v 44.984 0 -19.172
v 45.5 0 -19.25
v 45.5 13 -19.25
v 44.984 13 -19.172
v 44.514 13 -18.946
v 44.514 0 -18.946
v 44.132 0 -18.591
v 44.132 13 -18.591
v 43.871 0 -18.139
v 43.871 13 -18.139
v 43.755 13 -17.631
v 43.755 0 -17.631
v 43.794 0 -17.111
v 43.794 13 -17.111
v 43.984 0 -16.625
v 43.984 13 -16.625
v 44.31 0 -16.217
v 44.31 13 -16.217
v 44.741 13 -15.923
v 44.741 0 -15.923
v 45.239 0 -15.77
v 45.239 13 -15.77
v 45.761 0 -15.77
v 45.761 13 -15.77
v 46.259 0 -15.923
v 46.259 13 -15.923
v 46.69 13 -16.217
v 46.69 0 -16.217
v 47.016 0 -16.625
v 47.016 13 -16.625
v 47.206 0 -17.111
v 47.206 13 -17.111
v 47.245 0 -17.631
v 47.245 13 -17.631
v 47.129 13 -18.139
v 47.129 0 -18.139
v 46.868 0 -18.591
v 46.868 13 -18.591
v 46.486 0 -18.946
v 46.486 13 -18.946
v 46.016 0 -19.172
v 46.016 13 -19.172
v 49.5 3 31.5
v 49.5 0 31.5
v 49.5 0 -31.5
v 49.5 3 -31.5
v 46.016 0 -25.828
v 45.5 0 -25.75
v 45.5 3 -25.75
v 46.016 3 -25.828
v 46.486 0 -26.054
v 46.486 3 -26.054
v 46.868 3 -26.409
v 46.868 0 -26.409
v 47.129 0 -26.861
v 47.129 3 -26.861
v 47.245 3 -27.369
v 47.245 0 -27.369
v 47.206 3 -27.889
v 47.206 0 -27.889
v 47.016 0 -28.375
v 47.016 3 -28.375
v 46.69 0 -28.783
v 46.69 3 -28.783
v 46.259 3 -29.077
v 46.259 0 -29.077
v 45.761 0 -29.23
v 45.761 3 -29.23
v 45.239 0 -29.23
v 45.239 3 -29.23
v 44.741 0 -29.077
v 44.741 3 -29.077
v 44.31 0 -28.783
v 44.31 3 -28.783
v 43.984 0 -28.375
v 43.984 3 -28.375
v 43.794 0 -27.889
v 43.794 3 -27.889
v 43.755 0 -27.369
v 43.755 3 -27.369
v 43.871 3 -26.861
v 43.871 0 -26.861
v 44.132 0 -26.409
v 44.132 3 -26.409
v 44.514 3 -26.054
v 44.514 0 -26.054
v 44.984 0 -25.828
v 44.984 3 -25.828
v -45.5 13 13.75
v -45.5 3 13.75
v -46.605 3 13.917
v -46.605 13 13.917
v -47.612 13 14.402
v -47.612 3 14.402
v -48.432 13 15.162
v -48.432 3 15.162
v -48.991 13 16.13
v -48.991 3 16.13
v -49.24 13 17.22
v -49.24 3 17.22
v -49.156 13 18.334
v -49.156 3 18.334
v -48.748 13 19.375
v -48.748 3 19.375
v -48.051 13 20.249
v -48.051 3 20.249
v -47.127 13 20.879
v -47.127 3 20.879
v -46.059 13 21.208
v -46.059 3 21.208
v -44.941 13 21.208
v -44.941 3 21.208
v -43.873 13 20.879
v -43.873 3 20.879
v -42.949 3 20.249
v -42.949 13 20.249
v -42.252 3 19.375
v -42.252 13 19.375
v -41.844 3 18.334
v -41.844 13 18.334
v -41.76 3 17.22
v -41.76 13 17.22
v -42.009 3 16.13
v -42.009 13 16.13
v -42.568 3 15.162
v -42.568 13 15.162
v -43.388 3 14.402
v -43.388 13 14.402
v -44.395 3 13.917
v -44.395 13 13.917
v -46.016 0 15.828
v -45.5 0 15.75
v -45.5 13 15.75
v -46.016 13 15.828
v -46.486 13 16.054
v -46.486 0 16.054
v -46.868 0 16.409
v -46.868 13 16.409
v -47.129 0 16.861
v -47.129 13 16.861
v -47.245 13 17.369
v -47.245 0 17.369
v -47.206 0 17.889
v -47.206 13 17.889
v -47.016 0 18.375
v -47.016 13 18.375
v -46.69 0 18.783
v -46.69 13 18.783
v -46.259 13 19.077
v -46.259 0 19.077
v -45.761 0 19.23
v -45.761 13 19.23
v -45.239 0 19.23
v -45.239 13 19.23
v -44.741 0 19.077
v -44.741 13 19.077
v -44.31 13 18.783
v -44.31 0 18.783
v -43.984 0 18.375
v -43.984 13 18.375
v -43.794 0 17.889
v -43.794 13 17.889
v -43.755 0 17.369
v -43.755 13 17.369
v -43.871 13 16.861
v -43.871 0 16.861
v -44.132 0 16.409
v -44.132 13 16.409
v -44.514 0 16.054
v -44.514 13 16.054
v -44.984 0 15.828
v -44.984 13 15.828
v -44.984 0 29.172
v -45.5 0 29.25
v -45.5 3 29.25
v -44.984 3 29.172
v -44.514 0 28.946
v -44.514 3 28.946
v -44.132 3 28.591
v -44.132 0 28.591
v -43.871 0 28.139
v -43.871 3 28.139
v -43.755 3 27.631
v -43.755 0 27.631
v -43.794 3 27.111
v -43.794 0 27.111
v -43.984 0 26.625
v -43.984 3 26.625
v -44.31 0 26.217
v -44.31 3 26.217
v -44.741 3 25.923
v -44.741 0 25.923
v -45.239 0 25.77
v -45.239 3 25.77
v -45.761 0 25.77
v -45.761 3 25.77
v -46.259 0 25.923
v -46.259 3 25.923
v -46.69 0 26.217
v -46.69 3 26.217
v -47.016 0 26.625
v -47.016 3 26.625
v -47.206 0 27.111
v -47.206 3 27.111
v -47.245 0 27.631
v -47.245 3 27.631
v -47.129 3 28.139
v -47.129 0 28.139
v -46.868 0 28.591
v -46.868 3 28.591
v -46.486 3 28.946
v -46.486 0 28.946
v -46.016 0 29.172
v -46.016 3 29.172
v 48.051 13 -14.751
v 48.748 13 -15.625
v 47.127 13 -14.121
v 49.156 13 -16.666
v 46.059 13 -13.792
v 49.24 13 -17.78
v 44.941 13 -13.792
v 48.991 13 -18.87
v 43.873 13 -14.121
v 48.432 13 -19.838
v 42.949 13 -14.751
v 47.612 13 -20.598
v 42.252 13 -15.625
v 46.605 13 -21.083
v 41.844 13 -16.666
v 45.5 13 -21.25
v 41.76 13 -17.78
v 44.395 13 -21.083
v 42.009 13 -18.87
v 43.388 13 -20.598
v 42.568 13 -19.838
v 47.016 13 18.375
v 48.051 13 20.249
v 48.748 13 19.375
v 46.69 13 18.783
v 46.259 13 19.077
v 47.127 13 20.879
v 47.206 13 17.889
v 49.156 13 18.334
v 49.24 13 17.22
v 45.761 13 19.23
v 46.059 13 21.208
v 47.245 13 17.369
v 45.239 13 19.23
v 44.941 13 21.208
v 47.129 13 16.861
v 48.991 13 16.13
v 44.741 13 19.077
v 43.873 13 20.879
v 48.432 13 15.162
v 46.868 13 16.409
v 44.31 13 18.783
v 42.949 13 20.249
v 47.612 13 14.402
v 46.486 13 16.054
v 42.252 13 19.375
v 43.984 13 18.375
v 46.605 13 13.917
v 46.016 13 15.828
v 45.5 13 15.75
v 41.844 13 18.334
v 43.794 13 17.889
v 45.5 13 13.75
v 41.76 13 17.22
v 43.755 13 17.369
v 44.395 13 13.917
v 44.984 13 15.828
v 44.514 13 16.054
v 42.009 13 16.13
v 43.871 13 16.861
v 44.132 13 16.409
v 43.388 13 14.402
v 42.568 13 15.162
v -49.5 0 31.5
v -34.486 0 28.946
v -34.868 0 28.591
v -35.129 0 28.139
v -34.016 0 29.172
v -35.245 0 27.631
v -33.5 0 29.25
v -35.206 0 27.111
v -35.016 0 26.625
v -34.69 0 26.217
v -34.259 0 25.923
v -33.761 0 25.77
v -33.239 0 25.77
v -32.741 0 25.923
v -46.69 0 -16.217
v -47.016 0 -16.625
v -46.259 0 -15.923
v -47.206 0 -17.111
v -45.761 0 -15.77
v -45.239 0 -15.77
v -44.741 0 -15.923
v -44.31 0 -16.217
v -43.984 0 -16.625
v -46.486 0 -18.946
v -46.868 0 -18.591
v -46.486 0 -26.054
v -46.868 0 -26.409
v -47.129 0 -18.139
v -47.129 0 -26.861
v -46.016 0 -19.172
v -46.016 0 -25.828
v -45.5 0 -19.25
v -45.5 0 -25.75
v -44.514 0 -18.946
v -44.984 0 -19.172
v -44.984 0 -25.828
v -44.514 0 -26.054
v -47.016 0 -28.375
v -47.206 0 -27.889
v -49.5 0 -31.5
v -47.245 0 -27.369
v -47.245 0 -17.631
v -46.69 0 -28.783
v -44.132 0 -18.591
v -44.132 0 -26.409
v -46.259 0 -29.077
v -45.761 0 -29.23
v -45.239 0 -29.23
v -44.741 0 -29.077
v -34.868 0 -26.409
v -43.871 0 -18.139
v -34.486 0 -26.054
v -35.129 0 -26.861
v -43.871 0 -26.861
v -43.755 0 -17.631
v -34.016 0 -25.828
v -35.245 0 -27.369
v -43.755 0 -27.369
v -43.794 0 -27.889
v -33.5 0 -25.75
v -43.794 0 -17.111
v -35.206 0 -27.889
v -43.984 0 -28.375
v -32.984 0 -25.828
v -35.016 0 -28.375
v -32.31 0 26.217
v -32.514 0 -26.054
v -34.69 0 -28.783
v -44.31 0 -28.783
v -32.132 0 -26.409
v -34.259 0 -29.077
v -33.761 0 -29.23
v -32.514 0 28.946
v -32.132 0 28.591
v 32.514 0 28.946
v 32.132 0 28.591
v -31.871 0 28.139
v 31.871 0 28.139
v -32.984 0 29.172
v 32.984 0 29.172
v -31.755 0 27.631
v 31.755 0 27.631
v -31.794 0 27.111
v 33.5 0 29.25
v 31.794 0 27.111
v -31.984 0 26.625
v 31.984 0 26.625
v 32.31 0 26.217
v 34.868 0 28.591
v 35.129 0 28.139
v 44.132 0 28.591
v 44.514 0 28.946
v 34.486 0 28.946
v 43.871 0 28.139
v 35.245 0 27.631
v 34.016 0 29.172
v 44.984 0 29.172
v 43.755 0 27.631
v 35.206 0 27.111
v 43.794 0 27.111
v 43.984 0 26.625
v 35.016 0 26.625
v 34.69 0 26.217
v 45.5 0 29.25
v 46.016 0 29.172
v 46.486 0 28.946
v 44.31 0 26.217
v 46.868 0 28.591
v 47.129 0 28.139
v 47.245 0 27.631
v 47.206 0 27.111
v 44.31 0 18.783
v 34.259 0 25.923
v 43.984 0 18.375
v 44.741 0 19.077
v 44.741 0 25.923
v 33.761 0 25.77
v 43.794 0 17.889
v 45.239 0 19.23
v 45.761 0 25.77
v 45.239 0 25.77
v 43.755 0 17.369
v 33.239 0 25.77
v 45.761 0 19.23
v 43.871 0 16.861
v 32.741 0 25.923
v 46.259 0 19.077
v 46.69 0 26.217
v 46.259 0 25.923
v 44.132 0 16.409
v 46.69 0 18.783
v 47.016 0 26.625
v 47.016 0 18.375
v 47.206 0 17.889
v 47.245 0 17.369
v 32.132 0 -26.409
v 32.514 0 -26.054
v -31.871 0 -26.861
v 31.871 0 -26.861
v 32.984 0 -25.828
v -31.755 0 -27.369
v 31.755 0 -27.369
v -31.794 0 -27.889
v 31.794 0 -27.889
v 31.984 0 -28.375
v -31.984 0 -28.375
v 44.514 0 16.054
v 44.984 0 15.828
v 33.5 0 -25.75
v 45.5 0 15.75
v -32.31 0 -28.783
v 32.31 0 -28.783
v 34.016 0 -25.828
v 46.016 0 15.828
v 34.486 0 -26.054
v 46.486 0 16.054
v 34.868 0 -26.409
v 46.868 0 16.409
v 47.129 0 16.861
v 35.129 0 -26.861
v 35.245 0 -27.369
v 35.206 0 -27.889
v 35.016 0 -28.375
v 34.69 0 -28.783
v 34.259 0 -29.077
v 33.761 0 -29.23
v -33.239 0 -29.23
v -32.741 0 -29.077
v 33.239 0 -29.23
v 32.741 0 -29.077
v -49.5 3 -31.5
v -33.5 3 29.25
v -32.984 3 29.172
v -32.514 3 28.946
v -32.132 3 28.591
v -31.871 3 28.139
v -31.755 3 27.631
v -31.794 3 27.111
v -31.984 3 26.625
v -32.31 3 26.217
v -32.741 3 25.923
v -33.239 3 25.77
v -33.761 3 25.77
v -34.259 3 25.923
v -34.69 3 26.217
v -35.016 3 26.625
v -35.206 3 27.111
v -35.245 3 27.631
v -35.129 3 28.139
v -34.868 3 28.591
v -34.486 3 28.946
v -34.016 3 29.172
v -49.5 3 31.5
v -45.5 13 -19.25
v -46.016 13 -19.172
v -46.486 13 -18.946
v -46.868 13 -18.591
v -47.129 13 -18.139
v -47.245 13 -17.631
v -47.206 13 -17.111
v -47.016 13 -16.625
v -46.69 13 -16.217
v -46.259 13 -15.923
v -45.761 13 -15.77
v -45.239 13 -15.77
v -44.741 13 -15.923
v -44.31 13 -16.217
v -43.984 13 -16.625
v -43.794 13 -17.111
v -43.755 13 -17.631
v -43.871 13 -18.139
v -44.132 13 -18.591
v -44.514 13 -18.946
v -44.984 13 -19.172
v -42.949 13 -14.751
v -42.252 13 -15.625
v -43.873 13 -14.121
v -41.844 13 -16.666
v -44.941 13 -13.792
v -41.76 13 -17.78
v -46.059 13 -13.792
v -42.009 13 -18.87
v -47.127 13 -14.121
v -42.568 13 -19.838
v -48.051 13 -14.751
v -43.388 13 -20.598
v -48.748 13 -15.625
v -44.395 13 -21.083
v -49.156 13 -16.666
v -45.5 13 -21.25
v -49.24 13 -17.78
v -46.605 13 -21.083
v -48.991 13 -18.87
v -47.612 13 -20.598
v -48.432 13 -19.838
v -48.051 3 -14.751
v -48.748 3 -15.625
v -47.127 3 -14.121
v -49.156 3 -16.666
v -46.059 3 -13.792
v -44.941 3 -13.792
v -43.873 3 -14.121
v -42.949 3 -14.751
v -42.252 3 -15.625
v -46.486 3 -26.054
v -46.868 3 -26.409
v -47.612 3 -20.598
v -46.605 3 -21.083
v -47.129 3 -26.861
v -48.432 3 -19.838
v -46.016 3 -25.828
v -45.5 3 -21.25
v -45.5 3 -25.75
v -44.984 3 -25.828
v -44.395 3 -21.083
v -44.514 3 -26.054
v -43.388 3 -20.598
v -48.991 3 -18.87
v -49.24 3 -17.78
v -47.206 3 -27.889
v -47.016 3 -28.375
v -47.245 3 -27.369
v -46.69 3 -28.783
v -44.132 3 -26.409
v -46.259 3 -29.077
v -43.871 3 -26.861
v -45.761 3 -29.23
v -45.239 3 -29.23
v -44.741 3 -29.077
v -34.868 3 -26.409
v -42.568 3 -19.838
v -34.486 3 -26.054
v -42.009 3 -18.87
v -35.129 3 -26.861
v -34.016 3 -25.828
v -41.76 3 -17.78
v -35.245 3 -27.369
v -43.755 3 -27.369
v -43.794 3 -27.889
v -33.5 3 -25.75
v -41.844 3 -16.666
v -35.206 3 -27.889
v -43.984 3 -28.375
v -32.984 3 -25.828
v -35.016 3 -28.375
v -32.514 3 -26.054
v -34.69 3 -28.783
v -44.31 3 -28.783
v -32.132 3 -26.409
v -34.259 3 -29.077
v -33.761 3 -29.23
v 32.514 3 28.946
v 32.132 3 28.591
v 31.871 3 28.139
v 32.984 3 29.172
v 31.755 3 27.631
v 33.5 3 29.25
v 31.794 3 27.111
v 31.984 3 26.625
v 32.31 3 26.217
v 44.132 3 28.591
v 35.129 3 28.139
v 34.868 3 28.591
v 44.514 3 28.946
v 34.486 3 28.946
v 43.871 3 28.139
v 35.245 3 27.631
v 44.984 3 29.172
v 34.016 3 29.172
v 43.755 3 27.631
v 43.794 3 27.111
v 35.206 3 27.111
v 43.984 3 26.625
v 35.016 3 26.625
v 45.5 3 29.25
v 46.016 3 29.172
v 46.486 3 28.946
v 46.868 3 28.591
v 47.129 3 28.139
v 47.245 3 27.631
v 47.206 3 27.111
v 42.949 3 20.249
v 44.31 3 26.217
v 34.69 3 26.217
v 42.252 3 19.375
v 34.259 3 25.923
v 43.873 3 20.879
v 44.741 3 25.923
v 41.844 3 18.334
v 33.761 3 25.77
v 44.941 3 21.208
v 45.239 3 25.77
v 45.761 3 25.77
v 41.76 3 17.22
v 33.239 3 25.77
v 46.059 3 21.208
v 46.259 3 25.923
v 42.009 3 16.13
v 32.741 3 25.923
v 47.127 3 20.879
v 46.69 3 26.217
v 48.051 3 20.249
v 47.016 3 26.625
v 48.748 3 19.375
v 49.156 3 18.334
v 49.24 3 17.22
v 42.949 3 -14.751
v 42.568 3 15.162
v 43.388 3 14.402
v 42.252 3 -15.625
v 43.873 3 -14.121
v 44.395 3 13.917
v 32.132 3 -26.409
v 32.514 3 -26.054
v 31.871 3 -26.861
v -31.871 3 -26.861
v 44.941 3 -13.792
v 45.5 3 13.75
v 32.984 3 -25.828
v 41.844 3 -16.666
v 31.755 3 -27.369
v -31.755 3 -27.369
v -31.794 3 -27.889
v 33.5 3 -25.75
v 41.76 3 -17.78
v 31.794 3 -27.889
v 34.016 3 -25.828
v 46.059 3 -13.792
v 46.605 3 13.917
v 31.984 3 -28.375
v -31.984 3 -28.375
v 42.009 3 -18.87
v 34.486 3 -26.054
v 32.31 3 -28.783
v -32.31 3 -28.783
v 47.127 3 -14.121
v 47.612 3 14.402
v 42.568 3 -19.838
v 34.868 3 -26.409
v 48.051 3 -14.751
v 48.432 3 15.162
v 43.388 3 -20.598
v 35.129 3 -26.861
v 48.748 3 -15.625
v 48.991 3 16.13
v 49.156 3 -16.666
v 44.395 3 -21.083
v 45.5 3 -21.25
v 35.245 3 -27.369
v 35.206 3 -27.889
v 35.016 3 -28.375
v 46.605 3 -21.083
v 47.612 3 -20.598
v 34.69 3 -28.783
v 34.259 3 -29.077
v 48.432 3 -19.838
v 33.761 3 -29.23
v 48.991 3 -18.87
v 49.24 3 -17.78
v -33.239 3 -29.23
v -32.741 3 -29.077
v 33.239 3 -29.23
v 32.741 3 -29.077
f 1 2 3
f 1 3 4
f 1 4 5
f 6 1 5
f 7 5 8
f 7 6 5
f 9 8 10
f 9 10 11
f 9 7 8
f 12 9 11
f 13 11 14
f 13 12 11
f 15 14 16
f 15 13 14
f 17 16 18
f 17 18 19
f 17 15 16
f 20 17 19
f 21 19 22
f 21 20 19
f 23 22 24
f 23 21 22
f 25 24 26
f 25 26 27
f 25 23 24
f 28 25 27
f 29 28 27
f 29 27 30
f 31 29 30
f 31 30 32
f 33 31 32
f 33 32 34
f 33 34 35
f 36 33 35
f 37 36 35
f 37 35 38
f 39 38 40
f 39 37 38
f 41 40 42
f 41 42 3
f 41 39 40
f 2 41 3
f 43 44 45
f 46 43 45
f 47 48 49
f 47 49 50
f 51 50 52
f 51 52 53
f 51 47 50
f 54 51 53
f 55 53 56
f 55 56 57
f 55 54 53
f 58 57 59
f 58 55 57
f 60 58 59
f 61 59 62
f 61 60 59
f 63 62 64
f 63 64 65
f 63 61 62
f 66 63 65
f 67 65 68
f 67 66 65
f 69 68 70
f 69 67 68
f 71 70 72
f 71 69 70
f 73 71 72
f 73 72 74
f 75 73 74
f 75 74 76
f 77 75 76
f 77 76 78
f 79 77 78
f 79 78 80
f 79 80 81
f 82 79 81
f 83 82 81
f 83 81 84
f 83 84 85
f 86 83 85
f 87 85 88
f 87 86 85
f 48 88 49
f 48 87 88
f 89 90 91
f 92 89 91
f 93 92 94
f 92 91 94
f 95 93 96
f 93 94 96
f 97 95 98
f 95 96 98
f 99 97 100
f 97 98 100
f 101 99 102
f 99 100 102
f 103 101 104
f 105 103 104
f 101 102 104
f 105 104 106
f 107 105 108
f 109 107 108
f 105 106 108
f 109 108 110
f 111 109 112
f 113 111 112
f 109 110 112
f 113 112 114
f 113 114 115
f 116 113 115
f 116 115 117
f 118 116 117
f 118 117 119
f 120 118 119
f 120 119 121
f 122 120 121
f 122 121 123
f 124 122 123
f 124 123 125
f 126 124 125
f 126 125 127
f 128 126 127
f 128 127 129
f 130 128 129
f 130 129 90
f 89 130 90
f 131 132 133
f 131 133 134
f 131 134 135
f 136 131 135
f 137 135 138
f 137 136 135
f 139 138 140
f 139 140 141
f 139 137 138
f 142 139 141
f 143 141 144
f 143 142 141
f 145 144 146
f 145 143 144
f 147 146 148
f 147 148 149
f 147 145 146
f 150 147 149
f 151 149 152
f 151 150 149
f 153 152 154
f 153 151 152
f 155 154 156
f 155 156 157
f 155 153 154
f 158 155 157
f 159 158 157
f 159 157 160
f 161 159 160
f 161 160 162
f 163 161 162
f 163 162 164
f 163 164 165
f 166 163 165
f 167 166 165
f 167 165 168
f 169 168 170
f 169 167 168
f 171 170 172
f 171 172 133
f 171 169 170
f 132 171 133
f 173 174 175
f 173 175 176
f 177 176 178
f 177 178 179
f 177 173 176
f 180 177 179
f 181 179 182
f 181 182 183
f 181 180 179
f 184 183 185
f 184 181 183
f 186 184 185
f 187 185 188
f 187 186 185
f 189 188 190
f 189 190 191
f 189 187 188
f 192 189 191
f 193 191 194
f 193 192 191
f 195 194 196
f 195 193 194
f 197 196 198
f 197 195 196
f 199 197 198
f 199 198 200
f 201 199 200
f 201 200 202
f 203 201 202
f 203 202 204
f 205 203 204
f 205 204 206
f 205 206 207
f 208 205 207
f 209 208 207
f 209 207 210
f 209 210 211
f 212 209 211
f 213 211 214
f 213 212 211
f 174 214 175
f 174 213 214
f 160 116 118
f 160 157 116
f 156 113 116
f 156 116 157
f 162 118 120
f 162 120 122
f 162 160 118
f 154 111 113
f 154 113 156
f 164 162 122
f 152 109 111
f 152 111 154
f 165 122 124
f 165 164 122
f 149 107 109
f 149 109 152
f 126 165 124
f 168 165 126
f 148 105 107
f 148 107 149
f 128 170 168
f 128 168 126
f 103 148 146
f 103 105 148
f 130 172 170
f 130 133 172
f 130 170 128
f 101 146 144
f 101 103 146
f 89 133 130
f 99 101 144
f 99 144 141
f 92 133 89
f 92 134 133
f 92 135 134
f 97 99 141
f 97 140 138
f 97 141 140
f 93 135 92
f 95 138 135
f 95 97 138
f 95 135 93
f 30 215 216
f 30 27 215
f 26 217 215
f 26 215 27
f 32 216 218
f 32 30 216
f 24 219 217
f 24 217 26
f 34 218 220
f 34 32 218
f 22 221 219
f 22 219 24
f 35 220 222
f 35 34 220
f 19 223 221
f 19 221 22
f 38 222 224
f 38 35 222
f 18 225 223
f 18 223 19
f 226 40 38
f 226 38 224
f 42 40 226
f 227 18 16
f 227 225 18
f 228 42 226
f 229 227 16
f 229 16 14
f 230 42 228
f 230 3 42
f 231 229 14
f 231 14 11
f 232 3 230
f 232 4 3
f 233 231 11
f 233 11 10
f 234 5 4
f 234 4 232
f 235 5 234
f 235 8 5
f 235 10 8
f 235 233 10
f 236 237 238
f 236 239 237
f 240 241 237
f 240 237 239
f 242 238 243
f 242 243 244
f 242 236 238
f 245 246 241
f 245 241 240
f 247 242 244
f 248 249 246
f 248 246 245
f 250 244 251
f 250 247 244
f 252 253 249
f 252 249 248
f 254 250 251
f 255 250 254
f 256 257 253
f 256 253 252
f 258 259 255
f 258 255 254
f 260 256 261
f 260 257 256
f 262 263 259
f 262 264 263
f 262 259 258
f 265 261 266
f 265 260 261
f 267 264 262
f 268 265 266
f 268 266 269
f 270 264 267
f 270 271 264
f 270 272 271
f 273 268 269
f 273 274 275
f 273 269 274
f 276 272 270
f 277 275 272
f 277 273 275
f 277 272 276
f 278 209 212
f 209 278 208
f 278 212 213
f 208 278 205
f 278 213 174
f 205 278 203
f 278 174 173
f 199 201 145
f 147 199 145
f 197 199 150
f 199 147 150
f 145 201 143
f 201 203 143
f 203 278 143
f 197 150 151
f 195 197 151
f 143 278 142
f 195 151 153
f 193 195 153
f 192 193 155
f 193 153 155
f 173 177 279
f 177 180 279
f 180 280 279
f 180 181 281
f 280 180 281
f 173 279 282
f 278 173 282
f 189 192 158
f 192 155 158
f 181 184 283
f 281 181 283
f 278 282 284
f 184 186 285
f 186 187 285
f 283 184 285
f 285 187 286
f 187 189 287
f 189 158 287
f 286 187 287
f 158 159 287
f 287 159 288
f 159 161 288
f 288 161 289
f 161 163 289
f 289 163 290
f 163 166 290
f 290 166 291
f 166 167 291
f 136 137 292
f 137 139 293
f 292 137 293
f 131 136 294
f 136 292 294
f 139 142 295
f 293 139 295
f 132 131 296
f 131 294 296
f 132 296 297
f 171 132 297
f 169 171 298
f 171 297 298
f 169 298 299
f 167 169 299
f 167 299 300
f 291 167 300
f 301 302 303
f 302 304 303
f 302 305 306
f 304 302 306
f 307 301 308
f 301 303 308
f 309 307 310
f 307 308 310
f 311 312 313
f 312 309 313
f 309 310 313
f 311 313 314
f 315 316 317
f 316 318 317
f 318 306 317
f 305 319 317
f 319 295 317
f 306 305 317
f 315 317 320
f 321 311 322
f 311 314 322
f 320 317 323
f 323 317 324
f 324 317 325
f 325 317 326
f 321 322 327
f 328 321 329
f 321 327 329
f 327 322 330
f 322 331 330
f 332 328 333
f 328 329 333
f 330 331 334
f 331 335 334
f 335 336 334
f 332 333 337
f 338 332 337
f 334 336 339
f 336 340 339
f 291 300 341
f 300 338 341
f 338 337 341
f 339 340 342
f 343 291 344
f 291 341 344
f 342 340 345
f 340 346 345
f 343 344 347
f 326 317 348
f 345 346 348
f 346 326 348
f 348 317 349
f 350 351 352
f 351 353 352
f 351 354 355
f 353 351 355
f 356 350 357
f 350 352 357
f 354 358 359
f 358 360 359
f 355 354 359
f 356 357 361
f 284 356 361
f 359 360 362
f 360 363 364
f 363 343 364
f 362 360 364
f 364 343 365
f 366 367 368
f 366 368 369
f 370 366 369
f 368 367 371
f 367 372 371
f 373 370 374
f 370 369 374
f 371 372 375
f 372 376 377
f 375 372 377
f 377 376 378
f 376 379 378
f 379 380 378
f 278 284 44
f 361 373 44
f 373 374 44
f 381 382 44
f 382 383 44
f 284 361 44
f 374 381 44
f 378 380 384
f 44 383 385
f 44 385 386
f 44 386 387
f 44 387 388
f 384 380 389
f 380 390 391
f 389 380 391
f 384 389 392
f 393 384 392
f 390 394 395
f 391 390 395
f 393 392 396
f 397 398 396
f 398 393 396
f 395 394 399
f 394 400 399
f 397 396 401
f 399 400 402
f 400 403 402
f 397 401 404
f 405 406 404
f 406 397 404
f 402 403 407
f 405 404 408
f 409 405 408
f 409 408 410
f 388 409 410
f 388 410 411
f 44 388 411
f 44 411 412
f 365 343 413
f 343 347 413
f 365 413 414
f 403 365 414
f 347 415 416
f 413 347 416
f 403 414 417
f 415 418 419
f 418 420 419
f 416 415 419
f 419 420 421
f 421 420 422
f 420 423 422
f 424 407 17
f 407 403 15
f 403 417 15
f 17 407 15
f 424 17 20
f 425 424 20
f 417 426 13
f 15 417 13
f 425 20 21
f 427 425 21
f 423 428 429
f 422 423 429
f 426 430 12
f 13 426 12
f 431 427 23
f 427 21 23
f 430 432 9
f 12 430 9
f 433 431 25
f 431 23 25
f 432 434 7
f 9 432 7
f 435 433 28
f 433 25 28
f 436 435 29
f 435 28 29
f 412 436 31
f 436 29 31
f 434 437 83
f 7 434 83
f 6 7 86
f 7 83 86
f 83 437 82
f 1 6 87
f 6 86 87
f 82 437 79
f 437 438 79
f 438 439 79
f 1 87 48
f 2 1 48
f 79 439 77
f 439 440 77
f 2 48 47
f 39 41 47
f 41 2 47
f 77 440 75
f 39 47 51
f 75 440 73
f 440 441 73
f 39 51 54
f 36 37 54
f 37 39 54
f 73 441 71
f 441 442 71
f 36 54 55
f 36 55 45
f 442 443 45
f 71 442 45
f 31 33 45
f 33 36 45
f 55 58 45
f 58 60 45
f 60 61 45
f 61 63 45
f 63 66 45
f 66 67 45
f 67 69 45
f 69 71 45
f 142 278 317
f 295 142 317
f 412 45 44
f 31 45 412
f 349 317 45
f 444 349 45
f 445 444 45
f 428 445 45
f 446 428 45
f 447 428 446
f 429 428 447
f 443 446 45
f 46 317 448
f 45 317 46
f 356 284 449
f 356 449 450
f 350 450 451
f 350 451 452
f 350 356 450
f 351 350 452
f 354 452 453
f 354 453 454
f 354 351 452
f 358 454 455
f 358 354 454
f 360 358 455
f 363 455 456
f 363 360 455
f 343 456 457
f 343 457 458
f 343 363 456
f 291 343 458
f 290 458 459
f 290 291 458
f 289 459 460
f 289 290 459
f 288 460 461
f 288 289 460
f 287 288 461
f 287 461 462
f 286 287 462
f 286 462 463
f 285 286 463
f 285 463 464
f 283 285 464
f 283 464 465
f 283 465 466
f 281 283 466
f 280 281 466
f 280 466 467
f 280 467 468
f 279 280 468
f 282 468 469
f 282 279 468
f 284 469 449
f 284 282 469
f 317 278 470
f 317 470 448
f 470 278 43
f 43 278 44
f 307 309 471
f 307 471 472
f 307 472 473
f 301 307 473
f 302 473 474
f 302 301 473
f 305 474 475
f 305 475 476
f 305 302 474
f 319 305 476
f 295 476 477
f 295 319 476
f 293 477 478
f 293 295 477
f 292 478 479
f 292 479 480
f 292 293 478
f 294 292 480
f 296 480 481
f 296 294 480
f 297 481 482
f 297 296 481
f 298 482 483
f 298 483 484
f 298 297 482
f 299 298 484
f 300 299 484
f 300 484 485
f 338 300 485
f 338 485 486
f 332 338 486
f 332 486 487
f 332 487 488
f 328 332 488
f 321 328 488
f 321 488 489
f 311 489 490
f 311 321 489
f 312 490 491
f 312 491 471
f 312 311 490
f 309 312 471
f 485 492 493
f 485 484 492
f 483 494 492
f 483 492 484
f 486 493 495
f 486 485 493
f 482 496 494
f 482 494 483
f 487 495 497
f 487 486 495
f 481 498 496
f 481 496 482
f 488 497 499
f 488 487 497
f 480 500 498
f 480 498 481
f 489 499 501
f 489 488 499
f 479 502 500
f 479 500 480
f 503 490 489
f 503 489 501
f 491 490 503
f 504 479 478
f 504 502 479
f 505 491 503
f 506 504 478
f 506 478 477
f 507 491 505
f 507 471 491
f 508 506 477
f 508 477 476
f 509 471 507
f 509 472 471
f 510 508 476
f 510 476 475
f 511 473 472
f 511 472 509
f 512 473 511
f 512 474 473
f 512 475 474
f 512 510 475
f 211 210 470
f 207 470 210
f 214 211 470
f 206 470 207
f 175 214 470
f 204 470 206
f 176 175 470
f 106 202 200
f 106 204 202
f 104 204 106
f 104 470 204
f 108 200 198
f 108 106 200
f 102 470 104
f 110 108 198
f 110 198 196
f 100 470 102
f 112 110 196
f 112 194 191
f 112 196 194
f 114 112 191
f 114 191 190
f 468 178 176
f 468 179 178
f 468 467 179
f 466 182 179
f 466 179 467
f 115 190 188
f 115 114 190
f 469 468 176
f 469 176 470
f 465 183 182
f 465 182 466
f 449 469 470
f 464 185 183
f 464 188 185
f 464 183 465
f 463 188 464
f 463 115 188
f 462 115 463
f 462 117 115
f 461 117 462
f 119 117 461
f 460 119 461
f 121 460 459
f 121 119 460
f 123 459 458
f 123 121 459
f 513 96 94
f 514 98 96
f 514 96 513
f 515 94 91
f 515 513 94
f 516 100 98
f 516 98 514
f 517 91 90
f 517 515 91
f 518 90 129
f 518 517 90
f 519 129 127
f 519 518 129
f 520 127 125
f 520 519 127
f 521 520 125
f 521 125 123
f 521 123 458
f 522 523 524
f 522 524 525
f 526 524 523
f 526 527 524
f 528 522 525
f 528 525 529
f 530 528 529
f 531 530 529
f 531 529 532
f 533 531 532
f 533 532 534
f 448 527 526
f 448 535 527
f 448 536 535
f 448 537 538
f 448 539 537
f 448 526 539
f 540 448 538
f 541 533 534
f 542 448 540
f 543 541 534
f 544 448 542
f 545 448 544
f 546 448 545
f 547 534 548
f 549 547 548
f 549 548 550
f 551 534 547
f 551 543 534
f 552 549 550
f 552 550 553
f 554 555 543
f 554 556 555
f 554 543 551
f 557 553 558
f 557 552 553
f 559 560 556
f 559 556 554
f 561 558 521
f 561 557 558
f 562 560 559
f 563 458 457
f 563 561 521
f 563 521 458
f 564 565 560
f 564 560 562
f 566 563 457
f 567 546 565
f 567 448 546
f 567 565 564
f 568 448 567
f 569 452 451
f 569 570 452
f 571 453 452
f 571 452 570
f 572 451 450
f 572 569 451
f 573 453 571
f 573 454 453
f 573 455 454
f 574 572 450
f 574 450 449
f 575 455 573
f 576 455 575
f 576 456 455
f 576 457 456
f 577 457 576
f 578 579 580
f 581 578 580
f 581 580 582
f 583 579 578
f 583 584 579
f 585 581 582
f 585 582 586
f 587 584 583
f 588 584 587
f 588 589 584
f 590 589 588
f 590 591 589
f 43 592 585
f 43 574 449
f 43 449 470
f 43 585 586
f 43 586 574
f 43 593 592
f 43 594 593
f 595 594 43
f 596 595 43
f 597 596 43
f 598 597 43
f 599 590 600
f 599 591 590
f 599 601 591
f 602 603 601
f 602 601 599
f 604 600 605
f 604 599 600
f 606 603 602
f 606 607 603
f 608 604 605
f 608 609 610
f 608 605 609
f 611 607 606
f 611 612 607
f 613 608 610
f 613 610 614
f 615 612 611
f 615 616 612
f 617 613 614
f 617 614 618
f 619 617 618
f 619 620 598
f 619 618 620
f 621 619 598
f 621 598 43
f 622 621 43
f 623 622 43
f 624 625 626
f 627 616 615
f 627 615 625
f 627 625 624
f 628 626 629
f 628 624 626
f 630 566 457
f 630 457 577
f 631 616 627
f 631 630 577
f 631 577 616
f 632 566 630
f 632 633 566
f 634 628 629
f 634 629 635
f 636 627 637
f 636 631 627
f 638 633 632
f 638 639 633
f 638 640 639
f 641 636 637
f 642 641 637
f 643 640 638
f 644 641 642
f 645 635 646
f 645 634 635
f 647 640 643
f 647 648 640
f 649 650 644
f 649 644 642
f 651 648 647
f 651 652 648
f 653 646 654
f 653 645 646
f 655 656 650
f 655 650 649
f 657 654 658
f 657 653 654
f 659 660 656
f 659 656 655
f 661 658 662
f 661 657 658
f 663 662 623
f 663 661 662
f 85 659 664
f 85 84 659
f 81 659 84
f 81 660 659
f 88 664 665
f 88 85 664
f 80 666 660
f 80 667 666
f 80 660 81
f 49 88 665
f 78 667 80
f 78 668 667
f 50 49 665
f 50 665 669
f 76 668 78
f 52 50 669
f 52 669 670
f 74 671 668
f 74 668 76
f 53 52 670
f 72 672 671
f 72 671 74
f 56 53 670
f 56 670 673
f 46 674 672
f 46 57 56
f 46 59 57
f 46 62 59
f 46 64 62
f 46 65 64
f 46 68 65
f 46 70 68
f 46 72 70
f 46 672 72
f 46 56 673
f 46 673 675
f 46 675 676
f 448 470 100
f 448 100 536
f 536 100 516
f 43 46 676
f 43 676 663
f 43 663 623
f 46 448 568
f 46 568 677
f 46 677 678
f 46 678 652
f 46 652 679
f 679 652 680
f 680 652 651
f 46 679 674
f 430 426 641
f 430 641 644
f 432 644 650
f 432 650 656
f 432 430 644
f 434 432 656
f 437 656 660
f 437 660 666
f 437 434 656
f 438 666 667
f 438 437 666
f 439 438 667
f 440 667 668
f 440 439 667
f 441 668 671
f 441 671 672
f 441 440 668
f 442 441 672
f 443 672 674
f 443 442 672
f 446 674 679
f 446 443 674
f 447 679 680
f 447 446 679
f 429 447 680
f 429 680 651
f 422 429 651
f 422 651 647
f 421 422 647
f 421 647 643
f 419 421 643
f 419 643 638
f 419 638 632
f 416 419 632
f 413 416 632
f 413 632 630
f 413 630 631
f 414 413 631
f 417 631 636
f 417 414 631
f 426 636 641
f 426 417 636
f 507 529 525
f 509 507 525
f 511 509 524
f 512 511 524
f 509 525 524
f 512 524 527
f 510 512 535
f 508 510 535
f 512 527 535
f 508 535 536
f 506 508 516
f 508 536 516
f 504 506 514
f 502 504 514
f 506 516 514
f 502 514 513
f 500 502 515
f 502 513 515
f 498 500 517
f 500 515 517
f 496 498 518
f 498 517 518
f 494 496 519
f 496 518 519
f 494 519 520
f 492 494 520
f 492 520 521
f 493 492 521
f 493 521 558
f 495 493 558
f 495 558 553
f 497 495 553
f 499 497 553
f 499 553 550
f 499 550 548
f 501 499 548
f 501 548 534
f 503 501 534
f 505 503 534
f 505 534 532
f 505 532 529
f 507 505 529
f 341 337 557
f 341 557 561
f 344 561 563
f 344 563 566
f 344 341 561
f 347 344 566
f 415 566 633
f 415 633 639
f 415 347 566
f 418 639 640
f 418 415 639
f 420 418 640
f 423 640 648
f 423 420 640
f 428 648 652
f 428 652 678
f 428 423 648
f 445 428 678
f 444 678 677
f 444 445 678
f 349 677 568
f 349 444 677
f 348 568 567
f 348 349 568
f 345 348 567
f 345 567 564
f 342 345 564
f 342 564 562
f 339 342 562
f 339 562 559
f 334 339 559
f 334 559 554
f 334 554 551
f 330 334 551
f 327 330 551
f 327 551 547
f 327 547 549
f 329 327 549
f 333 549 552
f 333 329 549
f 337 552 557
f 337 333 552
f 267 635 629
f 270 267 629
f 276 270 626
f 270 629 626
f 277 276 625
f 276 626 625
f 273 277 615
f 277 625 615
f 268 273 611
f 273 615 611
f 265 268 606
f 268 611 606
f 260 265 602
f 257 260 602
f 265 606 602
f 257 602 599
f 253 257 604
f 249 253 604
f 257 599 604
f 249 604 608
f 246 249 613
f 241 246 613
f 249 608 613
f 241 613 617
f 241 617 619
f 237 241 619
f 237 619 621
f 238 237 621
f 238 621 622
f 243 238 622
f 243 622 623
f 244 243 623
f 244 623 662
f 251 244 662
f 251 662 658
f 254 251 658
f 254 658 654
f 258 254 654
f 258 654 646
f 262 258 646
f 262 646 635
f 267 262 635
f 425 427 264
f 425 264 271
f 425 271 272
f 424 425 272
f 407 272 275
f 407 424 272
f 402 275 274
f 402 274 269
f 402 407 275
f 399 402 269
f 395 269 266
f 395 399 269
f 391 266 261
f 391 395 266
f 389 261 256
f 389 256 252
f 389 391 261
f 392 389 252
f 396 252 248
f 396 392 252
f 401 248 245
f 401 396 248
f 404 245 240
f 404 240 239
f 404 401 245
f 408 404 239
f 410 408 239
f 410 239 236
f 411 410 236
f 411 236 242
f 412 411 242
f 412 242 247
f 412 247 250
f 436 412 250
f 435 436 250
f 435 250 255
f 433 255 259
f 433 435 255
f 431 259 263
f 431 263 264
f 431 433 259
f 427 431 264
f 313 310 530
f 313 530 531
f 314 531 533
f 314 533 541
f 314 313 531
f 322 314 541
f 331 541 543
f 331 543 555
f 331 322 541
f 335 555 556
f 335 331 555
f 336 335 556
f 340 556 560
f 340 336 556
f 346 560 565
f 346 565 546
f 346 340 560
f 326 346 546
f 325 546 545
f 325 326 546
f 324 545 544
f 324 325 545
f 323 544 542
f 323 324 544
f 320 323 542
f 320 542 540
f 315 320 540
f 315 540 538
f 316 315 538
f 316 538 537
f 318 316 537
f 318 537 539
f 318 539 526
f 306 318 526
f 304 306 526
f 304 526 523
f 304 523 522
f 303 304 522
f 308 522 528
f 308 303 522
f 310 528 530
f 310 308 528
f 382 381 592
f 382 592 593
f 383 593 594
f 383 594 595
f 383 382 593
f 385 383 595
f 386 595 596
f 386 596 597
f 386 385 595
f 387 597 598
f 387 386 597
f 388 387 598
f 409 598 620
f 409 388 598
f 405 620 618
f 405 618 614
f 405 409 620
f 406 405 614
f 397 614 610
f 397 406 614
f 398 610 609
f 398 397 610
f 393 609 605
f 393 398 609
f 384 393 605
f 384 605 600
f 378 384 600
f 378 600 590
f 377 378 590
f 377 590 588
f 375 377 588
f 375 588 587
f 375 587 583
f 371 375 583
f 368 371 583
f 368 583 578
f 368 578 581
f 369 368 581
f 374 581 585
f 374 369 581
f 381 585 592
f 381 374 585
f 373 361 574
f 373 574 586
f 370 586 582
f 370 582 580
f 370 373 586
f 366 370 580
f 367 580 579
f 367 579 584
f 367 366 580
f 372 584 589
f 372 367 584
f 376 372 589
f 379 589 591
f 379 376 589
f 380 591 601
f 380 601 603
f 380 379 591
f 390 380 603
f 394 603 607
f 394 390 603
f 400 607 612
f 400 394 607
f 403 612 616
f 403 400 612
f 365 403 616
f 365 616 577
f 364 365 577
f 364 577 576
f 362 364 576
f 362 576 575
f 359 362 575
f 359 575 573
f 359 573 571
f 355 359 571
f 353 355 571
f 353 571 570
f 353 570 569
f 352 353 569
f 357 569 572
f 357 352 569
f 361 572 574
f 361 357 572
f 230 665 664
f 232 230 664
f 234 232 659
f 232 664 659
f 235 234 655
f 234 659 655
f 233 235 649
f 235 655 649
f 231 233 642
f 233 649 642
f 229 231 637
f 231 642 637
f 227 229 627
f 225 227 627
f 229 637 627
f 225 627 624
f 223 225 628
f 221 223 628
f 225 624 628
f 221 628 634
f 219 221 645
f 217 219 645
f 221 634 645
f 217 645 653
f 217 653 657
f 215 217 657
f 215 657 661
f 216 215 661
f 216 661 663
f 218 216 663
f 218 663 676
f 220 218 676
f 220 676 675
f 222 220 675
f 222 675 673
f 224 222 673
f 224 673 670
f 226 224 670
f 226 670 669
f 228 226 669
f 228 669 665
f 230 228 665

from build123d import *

# Parameters (mm, degrees)
SKETCH1_W           = 99
SKETCH1_H           = 63
SKETCH1_R           = 3.75
SKETCH1_R_2         = 1.75
BOSS_EXTRUDE1_DEPTH = 3
SKETCH1_3_R         = 3.75
SKETCH1_3_R_2       = 1.75
BOSS_EXTRUDE2_DEPTH = 13


with BuildPart() as part:
    # Sketch1 → Boss-Extrude1 (new body)
    with BuildSketch(Plane(origin=(0, 0, 0), x_dir=(1, 0, 0), z_dir=(0, 1, 0))):
        Rectangle(SKETCH1_W, SKETCH1_H)
        with Locations((-45.5, -17.5)):
            Circle(SKETCH1_R, mode=Mode.SUBTRACT)
        with Locations((45.5, -17.5)):
            Circle(SKETCH1_R, mode=Mode.SUBTRACT)
        with Locations((-45.5, 17.5)):
            Circle(SKETCH1_R, mode=Mode.SUBTRACT)
        with Locations((45.5, 17.5)):
            Circle(SKETCH1_R, mode=Mode.SUBTRACT)
        with Locations((45.5, 27.5)):
            Circle(SKETCH1_R_2, mode=Mode.SUBTRACT)
        with Locations((-45.5, 27.5)):
            Circle(SKETCH1_R_2, mode=Mode.SUBTRACT)
        with Locations((-33.5, 27.5)):
            Circle(SKETCH1_R_2, mode=Mode.SUBTRACT)
        with Locations((33.5, 27.5)):
            Circle(SKETCH1_R_2, mode=Mode.SUBTRACT)
        with Locations((45.5, -27.5)):
            Circle(SKETCH1_R_2, mode=Mode.SUBTRACT)
        with Locations((-45.5, -27.5)):
            Circle(SKETCH1_R_2, mode=Mode.SUBTRACT)
        with Locations((-33.5, -27.5)):
            Circle(SKETCH1_R_2, mode=Mode.SUBTRACT)
        with Locations((33.5, -27.5)):
            Circle(SKETCH1_R_2, mode=Mode.SUBTRACT)
    extrude(amount=BOSS_EXTRUDE1_DEPTH)

    # Sketch1<3> → Boss-Extrude2 (add)
    # profile 1 of 4: a face of its own
    with BuildSketch(Plane(origin=(0, 0, 0), x_dir=(1, 0, 0), z_dir=(0, 1, 0))):
        with Locations((-45.5, 17.5)):
            Circle(SKETCH1_3_R)
        with Locations((-45.5, 17.5)):
            Circle(SKETCH1_3_R_2, mode=Mode.SUBTRACT)
    # profile 2 of 4: a face of its own
    with BuildSketch(Plane(origin=(0, 0, 0), x_dir=(1, 0, 0), z_dir=(0, 1, 0))):
        with Locations((-45.5, -17.5)):
            Circle(SKETCH1_3_R)
        with Locations((-45.5, -17.5)):
            Circle(SKETCH1_3_R_2, mode=Mode.SUBTRACT)
    # profile 3 of 4: a face of its own
    with BuildSketch(Plane(origin=(0, 0, 0), x_dir=(1, 0, 0), z_dir=(0, 1, 0))):
        with Locations((45.5, -17.5)):
            Circle(SKETCH1_3_R)
        with Locations((45.5, -17.5)):
            Circle(SKETCH1_3_R_2, mode=Mode.SUBTRACT)
    # profile 4 of 4: a face of its own
    with BuildSketch(Plane(origin=(0, 0, 0), x_dir=(1, 0, 0), z_dir=(0, 1, 0))):
        with Locations((45.5, 17.5)):
            Circle(SKETCH1_3_R)
        with Locations((45.5, 17.5)):
            Circle(SKETCH1_3_R_2, mode=Mode.SUBTRACT)
    extrude(amount=BOSS_EXTRUDE2_DEPTH)


solid = part.part
